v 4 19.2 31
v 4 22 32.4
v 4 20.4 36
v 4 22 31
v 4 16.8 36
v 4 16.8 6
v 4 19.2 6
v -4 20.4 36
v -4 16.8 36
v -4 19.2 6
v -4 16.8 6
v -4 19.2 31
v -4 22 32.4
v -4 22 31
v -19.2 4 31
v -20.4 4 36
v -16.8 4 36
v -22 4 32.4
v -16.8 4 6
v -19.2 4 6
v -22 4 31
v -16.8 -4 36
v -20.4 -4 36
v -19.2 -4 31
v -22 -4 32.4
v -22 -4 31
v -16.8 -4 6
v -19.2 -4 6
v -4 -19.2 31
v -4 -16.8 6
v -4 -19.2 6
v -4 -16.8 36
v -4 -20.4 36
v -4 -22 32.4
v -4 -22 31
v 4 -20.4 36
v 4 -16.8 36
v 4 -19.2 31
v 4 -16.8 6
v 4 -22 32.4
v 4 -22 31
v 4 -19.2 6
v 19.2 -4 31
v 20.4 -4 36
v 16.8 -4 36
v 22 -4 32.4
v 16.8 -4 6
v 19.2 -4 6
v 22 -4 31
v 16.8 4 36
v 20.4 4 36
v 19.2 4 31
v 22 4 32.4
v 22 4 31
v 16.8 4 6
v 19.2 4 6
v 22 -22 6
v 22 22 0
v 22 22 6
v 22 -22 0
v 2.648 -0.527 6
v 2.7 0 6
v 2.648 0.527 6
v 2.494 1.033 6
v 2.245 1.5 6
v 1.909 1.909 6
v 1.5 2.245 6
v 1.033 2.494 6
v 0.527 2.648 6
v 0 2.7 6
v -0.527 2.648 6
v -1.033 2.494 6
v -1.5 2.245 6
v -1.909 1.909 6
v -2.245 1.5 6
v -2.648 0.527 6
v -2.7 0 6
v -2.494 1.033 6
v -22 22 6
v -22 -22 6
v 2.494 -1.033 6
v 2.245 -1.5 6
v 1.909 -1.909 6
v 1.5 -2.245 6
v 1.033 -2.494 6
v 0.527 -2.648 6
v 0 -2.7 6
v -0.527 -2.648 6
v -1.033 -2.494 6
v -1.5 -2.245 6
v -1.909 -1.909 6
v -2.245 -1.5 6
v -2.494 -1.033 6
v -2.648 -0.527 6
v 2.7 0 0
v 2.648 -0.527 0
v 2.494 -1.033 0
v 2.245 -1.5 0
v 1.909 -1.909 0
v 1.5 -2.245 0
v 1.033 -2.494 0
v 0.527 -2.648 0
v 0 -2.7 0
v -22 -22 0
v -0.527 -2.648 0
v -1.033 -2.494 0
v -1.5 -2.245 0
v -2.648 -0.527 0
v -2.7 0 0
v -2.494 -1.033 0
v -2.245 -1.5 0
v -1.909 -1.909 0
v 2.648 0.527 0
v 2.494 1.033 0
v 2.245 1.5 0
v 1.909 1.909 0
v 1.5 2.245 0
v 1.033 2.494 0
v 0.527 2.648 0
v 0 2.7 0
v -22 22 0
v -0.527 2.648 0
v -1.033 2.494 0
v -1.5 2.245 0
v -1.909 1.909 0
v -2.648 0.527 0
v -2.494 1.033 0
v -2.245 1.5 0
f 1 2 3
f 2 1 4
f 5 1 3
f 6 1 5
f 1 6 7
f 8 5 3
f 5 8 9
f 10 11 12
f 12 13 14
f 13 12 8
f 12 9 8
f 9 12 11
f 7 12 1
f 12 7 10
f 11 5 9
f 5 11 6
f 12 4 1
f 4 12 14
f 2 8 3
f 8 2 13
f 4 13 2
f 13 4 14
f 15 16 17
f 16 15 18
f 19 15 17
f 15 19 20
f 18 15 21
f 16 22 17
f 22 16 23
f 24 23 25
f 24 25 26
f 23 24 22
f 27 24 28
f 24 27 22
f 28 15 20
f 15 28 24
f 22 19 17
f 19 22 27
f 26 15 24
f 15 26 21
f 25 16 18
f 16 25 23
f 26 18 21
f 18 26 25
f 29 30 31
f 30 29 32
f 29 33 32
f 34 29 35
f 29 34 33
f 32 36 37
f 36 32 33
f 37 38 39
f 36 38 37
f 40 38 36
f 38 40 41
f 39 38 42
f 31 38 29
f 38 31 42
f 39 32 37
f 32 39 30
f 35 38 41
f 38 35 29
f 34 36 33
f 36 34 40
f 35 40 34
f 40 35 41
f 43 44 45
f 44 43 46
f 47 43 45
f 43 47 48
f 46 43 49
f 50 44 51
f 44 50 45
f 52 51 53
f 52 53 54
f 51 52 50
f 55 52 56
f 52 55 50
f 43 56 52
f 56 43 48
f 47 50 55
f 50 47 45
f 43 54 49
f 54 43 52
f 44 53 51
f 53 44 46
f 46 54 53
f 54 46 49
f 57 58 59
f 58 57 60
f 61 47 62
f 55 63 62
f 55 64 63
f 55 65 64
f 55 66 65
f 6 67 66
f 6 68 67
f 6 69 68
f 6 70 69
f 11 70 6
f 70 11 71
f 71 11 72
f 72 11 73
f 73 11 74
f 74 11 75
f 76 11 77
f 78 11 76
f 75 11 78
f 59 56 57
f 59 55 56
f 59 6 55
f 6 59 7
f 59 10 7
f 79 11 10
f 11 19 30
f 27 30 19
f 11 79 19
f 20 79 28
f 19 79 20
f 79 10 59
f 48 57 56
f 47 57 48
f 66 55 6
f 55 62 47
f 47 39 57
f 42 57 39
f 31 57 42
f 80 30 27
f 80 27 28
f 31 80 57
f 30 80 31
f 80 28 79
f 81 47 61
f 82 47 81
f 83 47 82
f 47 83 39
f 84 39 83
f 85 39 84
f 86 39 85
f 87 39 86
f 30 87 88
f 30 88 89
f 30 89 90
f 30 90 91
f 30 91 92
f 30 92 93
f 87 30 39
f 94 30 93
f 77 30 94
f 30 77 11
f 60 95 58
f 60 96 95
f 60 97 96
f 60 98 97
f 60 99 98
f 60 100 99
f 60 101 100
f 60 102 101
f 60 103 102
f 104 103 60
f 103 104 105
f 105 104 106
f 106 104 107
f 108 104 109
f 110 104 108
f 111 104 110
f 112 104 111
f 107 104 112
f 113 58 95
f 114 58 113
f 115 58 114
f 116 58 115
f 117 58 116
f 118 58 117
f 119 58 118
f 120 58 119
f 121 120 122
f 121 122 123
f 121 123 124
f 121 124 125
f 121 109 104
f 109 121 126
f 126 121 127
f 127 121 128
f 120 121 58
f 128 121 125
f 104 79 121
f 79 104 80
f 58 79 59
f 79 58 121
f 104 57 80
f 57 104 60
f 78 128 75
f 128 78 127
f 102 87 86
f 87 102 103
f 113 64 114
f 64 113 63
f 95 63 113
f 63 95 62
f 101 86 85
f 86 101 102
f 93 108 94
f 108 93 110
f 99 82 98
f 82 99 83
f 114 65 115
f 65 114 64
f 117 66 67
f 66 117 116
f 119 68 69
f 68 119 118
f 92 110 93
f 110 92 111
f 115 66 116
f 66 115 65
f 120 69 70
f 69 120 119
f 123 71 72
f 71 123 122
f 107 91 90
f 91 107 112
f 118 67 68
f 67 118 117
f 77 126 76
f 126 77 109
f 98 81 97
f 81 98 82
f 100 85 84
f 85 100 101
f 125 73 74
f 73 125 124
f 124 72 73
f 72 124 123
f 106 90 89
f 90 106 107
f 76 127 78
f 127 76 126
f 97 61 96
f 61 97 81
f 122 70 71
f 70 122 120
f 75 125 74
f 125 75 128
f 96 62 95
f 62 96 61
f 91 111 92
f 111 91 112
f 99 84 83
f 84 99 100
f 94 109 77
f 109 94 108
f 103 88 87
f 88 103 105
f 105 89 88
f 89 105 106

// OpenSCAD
$fn = 32;

// ----------------------------------------------------------------------
// Snap-fit latch: 4 arms, 30 mm tall, 3 mm undercut hooks
// ----------------------------------------------------------------------

// --- parameters (mm) ---
base_d = 44;              // base plate depth
base_h = 6;               // base plate thickness
span = 36;                // distance between opposite arms
arm_t = 2.4;              // arm thickness
arm_d = 8;                // arm width
height = 30;              // free arm length
head_len = 3;             // hook reach
head_h = 5;               // hook height
lead = 1.4;               // lead-in ramp thickness
bore_d = 5.4;             // base fixing bore
top_z = 36;               // height of the arm tips above the base

arms = 4;

difference() {
  union() {
    /* base plate, centred on the arm ring */
    translate([-22, -22, 0]) cube([base_d, base_d, base_h]);
    for (a = [0 : 360 / arms : 359]) rotate([0, 0, a]) {
    /* arm, sunk 0.5 mm into the base */
    translate([-arm_d / 2, span / 2 - arm_t / 2, base_h - 0.5]) cube([arm_d, arm_t, height + 0.5]);
    /* hook: a convex hull of a tall inner block and a thin outer lip
       gives a flat undercut below and a lead-in ramp on top */
    hull() {
      translate([-arm_d / 2, span / 2 + arm_t / 2 - 0.6, top_z - head_h]) cube([arm_d, lead + 0.4, head_h]);
      translate([-arm_d / 2, span / 2 + arm_t / 2 - 0.2, top_z - head_h]) cube([arm_d, head_len, lead]);
    }
    }
  }
  translate([0, 0, -2.5]) cylinder(h = base_h + 5, d = bore_d);
}
